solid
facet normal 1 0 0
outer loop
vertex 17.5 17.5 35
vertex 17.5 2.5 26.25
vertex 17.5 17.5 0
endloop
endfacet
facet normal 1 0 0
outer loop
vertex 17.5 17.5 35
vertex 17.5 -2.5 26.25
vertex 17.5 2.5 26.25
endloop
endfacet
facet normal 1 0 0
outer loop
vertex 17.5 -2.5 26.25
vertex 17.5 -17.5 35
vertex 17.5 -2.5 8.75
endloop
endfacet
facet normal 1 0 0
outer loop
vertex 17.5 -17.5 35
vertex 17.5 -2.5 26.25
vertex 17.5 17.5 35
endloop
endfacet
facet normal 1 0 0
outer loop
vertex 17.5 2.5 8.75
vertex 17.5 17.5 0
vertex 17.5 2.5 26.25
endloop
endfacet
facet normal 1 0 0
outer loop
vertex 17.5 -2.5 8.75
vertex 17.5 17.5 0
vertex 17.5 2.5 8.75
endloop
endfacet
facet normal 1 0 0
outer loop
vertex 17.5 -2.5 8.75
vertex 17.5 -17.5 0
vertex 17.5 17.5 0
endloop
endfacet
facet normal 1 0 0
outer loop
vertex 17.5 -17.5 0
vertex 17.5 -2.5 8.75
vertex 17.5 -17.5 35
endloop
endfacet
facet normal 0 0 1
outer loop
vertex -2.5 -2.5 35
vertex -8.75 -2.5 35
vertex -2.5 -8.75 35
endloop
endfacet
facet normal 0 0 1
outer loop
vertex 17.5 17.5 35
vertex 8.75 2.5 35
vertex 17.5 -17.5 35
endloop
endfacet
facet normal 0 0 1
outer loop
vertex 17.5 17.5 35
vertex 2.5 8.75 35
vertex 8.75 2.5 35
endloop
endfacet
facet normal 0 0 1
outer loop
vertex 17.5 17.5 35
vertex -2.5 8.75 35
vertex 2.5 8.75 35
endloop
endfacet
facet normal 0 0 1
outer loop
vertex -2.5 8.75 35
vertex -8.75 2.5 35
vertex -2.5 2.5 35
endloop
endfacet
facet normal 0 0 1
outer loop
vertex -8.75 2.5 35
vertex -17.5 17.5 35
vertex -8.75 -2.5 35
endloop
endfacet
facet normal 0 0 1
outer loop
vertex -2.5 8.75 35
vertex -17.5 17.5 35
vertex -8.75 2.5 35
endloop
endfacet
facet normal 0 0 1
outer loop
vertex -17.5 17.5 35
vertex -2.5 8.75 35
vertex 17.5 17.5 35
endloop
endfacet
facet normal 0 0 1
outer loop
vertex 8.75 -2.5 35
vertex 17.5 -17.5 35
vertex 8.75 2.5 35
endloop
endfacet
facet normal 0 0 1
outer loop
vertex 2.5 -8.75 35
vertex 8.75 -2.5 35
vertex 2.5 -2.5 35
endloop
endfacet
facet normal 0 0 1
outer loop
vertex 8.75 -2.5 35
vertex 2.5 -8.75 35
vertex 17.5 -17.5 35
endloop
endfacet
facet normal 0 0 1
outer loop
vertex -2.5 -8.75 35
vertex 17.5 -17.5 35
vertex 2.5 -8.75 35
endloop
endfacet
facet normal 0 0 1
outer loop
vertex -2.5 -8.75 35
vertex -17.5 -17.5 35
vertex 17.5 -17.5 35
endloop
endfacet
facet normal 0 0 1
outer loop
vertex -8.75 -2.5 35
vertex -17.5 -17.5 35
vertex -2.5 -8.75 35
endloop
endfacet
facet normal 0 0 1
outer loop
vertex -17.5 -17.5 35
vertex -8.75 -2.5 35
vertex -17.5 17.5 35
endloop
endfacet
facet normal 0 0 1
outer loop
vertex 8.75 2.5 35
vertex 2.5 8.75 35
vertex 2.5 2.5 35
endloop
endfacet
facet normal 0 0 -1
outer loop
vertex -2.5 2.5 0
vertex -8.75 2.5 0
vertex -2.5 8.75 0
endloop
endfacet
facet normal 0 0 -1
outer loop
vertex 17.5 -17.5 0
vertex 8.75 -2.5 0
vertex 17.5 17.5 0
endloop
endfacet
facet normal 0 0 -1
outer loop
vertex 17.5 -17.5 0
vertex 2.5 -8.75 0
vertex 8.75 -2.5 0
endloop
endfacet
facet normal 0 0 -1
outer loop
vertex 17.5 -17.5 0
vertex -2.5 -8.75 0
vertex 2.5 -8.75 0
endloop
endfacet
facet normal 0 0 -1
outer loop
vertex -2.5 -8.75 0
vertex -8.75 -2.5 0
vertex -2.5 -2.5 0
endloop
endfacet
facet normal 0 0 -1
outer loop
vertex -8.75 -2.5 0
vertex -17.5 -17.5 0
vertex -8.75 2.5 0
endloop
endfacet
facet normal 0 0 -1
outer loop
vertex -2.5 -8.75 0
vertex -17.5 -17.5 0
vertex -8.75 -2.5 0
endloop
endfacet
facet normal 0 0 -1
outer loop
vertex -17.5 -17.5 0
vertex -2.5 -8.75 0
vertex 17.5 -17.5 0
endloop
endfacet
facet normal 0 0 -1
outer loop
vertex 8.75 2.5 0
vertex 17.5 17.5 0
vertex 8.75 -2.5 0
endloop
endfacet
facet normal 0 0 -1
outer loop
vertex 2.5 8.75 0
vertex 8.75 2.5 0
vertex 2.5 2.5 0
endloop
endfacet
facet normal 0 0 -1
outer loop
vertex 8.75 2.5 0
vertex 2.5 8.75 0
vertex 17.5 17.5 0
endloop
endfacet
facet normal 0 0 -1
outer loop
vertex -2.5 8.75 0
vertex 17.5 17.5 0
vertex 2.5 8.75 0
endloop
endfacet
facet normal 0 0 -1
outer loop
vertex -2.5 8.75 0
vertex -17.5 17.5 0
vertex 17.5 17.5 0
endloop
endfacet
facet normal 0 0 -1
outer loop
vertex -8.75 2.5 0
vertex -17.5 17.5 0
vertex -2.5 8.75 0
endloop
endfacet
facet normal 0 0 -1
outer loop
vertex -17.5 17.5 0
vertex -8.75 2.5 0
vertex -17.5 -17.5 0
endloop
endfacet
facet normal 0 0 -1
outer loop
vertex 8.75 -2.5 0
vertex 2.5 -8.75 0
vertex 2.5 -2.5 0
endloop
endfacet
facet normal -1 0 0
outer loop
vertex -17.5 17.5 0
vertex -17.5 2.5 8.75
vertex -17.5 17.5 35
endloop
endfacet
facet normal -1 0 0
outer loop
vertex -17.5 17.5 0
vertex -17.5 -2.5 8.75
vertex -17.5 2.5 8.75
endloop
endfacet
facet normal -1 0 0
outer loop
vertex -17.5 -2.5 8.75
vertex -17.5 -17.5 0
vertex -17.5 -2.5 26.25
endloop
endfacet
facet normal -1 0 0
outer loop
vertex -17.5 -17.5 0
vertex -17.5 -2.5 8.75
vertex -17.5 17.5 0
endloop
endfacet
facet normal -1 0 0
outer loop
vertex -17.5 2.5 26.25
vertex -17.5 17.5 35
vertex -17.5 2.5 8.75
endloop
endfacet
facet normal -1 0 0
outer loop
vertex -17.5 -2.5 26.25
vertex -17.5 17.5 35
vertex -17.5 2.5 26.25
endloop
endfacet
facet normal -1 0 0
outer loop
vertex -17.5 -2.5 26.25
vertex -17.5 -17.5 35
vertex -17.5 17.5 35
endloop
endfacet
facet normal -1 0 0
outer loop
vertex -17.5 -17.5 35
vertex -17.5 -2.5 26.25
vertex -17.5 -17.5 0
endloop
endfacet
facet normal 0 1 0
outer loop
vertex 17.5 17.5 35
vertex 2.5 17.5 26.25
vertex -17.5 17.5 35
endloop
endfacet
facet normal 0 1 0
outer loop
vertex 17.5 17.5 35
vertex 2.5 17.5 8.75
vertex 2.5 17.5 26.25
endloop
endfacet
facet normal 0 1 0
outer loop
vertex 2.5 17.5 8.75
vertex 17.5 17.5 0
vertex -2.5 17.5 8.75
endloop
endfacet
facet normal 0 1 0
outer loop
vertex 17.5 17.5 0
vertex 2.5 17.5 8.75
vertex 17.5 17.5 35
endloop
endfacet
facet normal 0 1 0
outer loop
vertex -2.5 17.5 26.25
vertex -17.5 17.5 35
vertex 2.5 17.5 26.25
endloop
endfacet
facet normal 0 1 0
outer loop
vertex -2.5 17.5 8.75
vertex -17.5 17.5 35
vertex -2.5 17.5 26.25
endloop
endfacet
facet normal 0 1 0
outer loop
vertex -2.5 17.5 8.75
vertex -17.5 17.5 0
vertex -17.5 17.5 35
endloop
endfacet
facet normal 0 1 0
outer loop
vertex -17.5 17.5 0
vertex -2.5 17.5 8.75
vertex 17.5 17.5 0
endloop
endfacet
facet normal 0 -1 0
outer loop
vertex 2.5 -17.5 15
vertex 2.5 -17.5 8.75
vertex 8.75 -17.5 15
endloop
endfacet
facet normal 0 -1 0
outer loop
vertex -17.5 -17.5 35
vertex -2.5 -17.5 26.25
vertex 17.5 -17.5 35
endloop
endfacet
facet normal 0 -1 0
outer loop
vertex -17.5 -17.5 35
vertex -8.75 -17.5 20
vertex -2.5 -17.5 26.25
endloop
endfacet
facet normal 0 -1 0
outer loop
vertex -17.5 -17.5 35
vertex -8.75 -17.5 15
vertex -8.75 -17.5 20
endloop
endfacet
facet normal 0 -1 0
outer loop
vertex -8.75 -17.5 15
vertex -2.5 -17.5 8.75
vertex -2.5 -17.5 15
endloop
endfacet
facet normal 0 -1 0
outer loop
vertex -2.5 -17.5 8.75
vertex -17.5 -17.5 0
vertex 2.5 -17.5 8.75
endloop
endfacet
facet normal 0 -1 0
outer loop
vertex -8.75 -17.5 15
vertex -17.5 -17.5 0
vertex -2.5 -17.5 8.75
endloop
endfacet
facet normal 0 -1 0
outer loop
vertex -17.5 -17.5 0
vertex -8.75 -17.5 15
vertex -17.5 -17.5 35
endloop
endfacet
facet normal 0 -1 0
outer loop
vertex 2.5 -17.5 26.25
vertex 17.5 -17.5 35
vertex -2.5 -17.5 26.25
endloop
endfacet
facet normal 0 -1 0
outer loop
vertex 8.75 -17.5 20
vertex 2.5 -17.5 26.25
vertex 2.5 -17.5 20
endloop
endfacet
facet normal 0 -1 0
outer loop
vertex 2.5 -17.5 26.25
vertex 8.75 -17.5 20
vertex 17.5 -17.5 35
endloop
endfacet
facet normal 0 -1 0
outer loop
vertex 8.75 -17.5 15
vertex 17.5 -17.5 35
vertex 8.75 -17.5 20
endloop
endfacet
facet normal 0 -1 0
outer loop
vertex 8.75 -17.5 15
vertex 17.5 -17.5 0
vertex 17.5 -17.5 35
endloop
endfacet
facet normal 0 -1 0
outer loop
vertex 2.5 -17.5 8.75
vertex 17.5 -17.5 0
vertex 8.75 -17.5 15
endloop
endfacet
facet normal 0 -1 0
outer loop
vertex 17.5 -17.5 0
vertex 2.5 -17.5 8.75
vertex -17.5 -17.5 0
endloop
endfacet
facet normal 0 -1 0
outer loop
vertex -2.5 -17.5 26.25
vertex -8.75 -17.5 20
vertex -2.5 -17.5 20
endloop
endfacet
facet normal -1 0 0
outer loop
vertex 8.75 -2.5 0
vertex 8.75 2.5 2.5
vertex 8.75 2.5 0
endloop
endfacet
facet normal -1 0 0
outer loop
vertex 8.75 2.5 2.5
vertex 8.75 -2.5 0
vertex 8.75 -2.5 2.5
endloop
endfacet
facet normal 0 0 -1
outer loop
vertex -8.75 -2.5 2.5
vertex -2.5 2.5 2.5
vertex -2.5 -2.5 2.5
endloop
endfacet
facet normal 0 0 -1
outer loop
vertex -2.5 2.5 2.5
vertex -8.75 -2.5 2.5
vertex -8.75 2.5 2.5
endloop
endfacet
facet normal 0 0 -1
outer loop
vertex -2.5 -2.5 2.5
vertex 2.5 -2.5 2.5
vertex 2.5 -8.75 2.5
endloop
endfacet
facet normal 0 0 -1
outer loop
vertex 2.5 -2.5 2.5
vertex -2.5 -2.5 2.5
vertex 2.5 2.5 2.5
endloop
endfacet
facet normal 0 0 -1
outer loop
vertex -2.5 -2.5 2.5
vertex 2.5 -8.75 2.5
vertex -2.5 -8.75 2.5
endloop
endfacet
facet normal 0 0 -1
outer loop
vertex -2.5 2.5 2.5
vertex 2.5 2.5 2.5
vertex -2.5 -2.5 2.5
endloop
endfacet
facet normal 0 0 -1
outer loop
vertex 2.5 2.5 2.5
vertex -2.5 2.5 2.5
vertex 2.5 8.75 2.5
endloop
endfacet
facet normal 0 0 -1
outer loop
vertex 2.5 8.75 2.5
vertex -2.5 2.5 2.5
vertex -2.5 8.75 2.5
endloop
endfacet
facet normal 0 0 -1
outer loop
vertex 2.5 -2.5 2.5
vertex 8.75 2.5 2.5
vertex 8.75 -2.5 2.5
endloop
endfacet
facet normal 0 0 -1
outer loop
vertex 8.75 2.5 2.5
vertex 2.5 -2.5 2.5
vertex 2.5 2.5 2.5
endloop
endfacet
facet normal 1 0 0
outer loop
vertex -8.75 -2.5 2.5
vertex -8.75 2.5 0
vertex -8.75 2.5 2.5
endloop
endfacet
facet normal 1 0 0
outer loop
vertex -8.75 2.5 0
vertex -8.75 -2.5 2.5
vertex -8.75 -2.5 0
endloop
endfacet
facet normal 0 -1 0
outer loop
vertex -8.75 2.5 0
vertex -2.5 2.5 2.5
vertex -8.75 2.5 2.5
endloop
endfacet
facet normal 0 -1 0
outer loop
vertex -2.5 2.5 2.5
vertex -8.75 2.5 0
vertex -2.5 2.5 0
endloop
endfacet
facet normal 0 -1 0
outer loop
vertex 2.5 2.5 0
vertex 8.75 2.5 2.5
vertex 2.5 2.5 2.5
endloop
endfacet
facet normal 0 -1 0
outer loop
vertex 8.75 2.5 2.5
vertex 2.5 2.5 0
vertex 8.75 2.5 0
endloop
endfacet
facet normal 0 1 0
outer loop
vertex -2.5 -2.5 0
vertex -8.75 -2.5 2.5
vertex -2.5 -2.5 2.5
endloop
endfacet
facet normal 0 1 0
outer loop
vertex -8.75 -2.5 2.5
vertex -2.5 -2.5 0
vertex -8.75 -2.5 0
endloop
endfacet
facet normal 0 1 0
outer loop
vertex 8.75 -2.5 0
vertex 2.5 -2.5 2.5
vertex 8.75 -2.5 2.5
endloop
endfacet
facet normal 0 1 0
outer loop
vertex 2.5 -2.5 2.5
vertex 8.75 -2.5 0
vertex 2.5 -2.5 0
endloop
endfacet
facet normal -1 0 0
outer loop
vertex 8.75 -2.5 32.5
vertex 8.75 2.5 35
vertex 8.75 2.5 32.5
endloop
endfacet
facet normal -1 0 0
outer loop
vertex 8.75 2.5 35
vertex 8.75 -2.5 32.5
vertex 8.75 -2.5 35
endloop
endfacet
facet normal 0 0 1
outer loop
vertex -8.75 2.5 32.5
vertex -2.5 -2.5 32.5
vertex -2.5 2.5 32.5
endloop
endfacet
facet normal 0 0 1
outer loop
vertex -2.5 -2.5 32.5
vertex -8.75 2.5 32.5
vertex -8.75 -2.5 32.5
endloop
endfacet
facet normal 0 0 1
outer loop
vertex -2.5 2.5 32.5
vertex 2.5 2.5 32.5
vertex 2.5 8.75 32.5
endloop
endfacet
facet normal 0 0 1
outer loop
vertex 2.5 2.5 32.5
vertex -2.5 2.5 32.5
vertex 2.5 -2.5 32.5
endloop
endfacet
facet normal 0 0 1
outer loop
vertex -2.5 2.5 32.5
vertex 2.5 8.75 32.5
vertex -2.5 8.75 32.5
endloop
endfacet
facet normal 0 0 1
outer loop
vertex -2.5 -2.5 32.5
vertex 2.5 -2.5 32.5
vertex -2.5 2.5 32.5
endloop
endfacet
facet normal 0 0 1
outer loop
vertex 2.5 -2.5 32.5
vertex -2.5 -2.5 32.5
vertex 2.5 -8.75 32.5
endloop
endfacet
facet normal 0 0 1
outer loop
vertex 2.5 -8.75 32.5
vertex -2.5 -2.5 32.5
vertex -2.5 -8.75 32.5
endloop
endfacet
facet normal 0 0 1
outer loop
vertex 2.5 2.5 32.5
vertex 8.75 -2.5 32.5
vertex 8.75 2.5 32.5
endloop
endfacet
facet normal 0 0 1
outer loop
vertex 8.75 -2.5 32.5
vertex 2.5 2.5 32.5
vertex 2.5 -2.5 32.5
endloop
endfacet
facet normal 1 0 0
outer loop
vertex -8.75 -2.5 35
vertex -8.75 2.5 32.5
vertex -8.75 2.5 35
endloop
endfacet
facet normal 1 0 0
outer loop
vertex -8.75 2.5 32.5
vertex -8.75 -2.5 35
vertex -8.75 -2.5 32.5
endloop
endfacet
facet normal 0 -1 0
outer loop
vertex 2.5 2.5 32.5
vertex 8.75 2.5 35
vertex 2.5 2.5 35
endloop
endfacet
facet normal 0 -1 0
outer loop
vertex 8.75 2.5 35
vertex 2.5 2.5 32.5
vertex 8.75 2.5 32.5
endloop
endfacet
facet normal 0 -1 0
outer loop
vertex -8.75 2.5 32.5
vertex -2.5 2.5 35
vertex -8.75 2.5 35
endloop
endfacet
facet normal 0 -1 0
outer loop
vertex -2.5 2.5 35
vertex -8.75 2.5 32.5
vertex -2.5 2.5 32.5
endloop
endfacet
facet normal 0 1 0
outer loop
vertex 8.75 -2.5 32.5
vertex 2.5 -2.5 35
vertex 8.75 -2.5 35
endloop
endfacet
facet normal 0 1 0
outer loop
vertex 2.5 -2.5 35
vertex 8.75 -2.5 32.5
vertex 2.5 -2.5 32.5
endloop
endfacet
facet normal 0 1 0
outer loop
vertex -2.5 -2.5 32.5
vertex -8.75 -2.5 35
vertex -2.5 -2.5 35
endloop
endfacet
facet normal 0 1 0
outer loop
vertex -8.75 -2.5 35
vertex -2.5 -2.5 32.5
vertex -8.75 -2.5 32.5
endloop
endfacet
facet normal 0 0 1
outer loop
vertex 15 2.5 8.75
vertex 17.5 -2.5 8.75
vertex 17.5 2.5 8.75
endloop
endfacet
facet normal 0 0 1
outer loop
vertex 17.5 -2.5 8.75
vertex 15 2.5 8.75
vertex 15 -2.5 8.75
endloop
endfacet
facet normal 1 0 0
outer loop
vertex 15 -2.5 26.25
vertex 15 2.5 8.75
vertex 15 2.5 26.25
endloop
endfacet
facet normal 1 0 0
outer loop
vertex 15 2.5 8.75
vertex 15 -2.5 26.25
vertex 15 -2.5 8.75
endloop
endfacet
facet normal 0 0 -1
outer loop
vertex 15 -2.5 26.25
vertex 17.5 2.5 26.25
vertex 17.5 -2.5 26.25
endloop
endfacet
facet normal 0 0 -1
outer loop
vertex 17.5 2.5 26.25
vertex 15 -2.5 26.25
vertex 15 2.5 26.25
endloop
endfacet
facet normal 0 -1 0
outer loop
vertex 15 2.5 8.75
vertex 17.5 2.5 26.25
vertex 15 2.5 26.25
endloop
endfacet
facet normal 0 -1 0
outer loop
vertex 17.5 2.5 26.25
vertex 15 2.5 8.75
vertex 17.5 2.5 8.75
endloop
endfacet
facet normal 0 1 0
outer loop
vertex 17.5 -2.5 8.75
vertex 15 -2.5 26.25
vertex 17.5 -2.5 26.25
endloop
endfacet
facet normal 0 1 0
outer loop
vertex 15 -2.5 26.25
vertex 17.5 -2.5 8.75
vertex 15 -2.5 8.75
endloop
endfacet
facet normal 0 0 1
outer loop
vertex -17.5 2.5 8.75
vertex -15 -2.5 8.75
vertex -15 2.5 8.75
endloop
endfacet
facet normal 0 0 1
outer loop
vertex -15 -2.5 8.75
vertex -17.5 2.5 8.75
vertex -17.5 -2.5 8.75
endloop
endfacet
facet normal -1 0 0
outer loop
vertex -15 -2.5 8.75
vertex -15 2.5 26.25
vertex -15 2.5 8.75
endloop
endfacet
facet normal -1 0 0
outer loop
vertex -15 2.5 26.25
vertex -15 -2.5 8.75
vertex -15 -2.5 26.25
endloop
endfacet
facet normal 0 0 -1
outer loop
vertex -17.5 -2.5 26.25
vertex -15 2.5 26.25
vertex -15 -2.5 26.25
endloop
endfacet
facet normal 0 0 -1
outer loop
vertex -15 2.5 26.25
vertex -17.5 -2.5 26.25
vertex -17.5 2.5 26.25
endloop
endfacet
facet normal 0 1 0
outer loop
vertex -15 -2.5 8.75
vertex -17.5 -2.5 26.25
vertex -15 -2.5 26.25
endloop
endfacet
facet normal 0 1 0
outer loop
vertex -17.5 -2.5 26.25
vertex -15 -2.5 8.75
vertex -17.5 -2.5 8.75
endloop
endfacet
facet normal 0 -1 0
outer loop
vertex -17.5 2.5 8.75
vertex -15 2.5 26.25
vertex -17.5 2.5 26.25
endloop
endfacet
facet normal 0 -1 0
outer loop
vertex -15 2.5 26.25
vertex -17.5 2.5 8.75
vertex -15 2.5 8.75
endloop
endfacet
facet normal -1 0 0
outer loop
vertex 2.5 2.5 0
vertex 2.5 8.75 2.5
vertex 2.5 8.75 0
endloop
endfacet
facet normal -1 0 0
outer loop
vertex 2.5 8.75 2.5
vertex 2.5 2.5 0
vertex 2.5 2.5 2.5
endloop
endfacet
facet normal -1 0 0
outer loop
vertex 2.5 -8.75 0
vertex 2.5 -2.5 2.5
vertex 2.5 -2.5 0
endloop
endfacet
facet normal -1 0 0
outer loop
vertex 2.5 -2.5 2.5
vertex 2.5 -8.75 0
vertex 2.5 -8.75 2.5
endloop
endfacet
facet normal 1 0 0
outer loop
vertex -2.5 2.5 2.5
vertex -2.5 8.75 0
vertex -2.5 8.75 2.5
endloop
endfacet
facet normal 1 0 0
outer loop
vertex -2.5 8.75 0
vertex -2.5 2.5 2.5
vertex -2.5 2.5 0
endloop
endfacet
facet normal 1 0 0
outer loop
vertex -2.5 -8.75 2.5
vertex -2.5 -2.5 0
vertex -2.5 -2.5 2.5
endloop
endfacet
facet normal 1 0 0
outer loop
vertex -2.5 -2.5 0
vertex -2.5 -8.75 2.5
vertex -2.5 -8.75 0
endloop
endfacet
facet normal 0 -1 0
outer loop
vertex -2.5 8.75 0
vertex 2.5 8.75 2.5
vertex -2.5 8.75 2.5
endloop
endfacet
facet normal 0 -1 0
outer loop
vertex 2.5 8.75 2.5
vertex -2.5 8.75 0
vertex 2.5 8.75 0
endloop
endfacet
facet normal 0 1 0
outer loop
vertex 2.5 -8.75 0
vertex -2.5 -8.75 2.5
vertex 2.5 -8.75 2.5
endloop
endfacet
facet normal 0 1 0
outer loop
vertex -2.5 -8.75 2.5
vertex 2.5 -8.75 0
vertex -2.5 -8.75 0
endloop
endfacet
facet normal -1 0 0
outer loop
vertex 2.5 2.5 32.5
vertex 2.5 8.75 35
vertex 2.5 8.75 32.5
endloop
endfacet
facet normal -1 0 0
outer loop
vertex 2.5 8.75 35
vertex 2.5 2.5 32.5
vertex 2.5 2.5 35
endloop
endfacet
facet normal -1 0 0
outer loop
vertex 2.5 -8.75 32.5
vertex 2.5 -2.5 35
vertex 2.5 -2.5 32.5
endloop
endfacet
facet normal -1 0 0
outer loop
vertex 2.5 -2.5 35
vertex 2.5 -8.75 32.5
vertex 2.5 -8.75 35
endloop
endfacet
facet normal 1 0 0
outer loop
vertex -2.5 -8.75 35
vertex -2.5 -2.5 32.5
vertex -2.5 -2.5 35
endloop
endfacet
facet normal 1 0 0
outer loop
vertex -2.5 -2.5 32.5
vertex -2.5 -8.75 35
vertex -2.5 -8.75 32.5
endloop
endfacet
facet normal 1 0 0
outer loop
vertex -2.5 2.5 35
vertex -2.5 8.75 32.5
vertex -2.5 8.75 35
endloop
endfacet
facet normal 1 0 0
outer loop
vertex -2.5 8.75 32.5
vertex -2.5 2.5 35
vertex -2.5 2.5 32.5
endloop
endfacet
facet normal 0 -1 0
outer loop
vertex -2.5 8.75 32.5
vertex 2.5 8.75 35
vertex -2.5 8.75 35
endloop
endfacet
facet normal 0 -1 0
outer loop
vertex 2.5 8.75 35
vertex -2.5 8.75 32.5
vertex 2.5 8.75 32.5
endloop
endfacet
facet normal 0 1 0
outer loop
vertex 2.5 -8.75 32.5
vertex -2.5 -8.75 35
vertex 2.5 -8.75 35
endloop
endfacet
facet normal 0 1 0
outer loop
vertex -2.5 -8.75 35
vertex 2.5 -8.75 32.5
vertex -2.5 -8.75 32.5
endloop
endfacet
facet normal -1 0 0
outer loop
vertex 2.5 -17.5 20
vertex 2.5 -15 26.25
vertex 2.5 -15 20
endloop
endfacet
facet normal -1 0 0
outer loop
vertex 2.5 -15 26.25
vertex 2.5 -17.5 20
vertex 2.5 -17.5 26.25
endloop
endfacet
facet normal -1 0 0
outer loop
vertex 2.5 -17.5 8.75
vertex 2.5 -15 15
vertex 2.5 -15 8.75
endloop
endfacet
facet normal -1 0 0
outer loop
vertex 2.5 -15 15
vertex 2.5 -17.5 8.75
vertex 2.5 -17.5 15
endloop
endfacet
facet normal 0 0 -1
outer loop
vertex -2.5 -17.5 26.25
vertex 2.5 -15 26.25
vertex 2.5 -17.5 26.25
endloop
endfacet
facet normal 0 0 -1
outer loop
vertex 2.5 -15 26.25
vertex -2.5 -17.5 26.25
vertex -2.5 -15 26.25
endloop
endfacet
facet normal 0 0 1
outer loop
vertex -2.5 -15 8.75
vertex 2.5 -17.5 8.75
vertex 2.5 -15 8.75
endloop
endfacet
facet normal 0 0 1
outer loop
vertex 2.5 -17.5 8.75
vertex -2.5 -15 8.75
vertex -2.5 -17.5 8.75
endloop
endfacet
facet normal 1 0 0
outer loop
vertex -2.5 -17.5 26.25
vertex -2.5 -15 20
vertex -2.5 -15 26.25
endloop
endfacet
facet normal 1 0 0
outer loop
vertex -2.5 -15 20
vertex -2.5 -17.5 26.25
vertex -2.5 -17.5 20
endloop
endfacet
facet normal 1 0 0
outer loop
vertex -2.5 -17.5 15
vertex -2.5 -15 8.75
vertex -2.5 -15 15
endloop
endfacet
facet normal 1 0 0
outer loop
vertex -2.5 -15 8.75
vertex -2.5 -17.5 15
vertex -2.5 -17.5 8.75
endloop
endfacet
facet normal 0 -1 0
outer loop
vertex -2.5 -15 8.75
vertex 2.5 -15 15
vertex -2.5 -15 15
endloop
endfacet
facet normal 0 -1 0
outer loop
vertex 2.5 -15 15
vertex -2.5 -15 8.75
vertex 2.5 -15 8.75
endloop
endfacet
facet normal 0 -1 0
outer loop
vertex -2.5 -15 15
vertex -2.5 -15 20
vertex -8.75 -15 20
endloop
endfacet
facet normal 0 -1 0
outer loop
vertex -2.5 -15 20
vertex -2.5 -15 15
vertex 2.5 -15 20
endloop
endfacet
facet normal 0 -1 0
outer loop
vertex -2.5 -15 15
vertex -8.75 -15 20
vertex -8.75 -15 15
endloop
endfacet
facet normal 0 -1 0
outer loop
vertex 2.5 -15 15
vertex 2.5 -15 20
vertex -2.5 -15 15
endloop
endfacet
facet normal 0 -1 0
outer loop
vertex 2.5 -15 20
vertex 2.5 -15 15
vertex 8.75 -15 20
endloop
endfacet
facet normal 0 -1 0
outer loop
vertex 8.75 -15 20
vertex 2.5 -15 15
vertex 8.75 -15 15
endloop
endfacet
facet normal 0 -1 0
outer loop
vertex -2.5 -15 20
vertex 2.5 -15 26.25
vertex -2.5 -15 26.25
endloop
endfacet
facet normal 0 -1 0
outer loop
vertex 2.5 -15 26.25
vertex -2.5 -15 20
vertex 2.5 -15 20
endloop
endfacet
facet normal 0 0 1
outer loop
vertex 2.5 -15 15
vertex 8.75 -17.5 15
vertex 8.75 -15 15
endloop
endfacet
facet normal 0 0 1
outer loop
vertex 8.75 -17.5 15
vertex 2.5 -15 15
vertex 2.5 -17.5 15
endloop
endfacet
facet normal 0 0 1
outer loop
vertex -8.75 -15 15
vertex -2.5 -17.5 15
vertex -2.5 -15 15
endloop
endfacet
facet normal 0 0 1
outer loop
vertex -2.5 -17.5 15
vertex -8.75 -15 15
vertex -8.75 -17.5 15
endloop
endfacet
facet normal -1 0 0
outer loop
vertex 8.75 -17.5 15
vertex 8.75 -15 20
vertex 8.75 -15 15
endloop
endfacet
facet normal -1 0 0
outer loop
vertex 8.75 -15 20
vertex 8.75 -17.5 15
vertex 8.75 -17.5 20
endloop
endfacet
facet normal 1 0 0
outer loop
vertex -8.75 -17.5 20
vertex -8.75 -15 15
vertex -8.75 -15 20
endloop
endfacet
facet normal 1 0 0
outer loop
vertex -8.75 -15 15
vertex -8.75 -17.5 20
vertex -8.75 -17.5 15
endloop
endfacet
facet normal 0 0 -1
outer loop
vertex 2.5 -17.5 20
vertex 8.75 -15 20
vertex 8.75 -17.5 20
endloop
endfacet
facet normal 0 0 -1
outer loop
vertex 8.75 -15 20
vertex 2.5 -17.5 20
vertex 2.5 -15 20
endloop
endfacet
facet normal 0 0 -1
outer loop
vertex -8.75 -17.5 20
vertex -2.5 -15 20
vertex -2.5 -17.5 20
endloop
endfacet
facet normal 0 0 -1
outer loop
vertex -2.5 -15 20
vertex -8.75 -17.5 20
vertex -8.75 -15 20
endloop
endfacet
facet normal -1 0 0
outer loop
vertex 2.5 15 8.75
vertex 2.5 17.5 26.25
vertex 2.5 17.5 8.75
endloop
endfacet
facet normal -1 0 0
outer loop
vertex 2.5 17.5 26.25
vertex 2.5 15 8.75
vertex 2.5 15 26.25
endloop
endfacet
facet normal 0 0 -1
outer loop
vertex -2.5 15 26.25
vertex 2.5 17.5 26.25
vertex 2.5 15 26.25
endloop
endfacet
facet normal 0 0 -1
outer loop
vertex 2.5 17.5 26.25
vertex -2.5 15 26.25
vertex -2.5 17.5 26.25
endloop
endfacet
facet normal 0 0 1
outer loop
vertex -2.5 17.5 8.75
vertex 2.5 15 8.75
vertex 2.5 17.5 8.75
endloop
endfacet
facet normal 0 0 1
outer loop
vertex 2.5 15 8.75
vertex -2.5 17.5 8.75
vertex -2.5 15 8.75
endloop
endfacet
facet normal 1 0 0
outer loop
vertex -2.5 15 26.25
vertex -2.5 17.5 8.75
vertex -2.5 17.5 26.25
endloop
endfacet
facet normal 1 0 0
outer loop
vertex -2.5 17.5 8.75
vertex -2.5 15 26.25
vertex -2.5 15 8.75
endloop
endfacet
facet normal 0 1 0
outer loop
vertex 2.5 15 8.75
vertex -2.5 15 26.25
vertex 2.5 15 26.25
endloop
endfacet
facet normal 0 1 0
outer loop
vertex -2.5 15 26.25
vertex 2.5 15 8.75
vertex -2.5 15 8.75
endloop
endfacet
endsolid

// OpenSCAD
l=140;
w=140;
h=140;
scale([.25,.25,.25])

difference()
{
   translate([0,0,70])
    cube([l,w,h], center=true);

translate([0,0,0])
    cube([l/2,20,20],center=true);
    
translate([0,0,h])
    cube([l/2,20,20],center=true);
    
rotate([0,90,0])    
translate([-l/2,0,h/2])
    cube([l/2,20,20],center=true);
    
rotate([0,90,0])    
translate([-l/2,0,-h/2])
    cube([l/2,20,20],center=true);
    
        
  
translate([0,0,0])
    cube([20,w/2,20],center=true);
    
translate([0,0,h])
    cube([20,w/2,20],center=true);  
  
translate([0,-w/2,h/2])
    cube([20,20,h/2],center=true);  
 
 rotate([0,90,0])
 translate([-h/2,-w/2,0])
    cube([20,20,h/2],center=true); 
    
 translate([0,w/2,h/2])
    cube([20,20,h/2],center=true);  
    

}
